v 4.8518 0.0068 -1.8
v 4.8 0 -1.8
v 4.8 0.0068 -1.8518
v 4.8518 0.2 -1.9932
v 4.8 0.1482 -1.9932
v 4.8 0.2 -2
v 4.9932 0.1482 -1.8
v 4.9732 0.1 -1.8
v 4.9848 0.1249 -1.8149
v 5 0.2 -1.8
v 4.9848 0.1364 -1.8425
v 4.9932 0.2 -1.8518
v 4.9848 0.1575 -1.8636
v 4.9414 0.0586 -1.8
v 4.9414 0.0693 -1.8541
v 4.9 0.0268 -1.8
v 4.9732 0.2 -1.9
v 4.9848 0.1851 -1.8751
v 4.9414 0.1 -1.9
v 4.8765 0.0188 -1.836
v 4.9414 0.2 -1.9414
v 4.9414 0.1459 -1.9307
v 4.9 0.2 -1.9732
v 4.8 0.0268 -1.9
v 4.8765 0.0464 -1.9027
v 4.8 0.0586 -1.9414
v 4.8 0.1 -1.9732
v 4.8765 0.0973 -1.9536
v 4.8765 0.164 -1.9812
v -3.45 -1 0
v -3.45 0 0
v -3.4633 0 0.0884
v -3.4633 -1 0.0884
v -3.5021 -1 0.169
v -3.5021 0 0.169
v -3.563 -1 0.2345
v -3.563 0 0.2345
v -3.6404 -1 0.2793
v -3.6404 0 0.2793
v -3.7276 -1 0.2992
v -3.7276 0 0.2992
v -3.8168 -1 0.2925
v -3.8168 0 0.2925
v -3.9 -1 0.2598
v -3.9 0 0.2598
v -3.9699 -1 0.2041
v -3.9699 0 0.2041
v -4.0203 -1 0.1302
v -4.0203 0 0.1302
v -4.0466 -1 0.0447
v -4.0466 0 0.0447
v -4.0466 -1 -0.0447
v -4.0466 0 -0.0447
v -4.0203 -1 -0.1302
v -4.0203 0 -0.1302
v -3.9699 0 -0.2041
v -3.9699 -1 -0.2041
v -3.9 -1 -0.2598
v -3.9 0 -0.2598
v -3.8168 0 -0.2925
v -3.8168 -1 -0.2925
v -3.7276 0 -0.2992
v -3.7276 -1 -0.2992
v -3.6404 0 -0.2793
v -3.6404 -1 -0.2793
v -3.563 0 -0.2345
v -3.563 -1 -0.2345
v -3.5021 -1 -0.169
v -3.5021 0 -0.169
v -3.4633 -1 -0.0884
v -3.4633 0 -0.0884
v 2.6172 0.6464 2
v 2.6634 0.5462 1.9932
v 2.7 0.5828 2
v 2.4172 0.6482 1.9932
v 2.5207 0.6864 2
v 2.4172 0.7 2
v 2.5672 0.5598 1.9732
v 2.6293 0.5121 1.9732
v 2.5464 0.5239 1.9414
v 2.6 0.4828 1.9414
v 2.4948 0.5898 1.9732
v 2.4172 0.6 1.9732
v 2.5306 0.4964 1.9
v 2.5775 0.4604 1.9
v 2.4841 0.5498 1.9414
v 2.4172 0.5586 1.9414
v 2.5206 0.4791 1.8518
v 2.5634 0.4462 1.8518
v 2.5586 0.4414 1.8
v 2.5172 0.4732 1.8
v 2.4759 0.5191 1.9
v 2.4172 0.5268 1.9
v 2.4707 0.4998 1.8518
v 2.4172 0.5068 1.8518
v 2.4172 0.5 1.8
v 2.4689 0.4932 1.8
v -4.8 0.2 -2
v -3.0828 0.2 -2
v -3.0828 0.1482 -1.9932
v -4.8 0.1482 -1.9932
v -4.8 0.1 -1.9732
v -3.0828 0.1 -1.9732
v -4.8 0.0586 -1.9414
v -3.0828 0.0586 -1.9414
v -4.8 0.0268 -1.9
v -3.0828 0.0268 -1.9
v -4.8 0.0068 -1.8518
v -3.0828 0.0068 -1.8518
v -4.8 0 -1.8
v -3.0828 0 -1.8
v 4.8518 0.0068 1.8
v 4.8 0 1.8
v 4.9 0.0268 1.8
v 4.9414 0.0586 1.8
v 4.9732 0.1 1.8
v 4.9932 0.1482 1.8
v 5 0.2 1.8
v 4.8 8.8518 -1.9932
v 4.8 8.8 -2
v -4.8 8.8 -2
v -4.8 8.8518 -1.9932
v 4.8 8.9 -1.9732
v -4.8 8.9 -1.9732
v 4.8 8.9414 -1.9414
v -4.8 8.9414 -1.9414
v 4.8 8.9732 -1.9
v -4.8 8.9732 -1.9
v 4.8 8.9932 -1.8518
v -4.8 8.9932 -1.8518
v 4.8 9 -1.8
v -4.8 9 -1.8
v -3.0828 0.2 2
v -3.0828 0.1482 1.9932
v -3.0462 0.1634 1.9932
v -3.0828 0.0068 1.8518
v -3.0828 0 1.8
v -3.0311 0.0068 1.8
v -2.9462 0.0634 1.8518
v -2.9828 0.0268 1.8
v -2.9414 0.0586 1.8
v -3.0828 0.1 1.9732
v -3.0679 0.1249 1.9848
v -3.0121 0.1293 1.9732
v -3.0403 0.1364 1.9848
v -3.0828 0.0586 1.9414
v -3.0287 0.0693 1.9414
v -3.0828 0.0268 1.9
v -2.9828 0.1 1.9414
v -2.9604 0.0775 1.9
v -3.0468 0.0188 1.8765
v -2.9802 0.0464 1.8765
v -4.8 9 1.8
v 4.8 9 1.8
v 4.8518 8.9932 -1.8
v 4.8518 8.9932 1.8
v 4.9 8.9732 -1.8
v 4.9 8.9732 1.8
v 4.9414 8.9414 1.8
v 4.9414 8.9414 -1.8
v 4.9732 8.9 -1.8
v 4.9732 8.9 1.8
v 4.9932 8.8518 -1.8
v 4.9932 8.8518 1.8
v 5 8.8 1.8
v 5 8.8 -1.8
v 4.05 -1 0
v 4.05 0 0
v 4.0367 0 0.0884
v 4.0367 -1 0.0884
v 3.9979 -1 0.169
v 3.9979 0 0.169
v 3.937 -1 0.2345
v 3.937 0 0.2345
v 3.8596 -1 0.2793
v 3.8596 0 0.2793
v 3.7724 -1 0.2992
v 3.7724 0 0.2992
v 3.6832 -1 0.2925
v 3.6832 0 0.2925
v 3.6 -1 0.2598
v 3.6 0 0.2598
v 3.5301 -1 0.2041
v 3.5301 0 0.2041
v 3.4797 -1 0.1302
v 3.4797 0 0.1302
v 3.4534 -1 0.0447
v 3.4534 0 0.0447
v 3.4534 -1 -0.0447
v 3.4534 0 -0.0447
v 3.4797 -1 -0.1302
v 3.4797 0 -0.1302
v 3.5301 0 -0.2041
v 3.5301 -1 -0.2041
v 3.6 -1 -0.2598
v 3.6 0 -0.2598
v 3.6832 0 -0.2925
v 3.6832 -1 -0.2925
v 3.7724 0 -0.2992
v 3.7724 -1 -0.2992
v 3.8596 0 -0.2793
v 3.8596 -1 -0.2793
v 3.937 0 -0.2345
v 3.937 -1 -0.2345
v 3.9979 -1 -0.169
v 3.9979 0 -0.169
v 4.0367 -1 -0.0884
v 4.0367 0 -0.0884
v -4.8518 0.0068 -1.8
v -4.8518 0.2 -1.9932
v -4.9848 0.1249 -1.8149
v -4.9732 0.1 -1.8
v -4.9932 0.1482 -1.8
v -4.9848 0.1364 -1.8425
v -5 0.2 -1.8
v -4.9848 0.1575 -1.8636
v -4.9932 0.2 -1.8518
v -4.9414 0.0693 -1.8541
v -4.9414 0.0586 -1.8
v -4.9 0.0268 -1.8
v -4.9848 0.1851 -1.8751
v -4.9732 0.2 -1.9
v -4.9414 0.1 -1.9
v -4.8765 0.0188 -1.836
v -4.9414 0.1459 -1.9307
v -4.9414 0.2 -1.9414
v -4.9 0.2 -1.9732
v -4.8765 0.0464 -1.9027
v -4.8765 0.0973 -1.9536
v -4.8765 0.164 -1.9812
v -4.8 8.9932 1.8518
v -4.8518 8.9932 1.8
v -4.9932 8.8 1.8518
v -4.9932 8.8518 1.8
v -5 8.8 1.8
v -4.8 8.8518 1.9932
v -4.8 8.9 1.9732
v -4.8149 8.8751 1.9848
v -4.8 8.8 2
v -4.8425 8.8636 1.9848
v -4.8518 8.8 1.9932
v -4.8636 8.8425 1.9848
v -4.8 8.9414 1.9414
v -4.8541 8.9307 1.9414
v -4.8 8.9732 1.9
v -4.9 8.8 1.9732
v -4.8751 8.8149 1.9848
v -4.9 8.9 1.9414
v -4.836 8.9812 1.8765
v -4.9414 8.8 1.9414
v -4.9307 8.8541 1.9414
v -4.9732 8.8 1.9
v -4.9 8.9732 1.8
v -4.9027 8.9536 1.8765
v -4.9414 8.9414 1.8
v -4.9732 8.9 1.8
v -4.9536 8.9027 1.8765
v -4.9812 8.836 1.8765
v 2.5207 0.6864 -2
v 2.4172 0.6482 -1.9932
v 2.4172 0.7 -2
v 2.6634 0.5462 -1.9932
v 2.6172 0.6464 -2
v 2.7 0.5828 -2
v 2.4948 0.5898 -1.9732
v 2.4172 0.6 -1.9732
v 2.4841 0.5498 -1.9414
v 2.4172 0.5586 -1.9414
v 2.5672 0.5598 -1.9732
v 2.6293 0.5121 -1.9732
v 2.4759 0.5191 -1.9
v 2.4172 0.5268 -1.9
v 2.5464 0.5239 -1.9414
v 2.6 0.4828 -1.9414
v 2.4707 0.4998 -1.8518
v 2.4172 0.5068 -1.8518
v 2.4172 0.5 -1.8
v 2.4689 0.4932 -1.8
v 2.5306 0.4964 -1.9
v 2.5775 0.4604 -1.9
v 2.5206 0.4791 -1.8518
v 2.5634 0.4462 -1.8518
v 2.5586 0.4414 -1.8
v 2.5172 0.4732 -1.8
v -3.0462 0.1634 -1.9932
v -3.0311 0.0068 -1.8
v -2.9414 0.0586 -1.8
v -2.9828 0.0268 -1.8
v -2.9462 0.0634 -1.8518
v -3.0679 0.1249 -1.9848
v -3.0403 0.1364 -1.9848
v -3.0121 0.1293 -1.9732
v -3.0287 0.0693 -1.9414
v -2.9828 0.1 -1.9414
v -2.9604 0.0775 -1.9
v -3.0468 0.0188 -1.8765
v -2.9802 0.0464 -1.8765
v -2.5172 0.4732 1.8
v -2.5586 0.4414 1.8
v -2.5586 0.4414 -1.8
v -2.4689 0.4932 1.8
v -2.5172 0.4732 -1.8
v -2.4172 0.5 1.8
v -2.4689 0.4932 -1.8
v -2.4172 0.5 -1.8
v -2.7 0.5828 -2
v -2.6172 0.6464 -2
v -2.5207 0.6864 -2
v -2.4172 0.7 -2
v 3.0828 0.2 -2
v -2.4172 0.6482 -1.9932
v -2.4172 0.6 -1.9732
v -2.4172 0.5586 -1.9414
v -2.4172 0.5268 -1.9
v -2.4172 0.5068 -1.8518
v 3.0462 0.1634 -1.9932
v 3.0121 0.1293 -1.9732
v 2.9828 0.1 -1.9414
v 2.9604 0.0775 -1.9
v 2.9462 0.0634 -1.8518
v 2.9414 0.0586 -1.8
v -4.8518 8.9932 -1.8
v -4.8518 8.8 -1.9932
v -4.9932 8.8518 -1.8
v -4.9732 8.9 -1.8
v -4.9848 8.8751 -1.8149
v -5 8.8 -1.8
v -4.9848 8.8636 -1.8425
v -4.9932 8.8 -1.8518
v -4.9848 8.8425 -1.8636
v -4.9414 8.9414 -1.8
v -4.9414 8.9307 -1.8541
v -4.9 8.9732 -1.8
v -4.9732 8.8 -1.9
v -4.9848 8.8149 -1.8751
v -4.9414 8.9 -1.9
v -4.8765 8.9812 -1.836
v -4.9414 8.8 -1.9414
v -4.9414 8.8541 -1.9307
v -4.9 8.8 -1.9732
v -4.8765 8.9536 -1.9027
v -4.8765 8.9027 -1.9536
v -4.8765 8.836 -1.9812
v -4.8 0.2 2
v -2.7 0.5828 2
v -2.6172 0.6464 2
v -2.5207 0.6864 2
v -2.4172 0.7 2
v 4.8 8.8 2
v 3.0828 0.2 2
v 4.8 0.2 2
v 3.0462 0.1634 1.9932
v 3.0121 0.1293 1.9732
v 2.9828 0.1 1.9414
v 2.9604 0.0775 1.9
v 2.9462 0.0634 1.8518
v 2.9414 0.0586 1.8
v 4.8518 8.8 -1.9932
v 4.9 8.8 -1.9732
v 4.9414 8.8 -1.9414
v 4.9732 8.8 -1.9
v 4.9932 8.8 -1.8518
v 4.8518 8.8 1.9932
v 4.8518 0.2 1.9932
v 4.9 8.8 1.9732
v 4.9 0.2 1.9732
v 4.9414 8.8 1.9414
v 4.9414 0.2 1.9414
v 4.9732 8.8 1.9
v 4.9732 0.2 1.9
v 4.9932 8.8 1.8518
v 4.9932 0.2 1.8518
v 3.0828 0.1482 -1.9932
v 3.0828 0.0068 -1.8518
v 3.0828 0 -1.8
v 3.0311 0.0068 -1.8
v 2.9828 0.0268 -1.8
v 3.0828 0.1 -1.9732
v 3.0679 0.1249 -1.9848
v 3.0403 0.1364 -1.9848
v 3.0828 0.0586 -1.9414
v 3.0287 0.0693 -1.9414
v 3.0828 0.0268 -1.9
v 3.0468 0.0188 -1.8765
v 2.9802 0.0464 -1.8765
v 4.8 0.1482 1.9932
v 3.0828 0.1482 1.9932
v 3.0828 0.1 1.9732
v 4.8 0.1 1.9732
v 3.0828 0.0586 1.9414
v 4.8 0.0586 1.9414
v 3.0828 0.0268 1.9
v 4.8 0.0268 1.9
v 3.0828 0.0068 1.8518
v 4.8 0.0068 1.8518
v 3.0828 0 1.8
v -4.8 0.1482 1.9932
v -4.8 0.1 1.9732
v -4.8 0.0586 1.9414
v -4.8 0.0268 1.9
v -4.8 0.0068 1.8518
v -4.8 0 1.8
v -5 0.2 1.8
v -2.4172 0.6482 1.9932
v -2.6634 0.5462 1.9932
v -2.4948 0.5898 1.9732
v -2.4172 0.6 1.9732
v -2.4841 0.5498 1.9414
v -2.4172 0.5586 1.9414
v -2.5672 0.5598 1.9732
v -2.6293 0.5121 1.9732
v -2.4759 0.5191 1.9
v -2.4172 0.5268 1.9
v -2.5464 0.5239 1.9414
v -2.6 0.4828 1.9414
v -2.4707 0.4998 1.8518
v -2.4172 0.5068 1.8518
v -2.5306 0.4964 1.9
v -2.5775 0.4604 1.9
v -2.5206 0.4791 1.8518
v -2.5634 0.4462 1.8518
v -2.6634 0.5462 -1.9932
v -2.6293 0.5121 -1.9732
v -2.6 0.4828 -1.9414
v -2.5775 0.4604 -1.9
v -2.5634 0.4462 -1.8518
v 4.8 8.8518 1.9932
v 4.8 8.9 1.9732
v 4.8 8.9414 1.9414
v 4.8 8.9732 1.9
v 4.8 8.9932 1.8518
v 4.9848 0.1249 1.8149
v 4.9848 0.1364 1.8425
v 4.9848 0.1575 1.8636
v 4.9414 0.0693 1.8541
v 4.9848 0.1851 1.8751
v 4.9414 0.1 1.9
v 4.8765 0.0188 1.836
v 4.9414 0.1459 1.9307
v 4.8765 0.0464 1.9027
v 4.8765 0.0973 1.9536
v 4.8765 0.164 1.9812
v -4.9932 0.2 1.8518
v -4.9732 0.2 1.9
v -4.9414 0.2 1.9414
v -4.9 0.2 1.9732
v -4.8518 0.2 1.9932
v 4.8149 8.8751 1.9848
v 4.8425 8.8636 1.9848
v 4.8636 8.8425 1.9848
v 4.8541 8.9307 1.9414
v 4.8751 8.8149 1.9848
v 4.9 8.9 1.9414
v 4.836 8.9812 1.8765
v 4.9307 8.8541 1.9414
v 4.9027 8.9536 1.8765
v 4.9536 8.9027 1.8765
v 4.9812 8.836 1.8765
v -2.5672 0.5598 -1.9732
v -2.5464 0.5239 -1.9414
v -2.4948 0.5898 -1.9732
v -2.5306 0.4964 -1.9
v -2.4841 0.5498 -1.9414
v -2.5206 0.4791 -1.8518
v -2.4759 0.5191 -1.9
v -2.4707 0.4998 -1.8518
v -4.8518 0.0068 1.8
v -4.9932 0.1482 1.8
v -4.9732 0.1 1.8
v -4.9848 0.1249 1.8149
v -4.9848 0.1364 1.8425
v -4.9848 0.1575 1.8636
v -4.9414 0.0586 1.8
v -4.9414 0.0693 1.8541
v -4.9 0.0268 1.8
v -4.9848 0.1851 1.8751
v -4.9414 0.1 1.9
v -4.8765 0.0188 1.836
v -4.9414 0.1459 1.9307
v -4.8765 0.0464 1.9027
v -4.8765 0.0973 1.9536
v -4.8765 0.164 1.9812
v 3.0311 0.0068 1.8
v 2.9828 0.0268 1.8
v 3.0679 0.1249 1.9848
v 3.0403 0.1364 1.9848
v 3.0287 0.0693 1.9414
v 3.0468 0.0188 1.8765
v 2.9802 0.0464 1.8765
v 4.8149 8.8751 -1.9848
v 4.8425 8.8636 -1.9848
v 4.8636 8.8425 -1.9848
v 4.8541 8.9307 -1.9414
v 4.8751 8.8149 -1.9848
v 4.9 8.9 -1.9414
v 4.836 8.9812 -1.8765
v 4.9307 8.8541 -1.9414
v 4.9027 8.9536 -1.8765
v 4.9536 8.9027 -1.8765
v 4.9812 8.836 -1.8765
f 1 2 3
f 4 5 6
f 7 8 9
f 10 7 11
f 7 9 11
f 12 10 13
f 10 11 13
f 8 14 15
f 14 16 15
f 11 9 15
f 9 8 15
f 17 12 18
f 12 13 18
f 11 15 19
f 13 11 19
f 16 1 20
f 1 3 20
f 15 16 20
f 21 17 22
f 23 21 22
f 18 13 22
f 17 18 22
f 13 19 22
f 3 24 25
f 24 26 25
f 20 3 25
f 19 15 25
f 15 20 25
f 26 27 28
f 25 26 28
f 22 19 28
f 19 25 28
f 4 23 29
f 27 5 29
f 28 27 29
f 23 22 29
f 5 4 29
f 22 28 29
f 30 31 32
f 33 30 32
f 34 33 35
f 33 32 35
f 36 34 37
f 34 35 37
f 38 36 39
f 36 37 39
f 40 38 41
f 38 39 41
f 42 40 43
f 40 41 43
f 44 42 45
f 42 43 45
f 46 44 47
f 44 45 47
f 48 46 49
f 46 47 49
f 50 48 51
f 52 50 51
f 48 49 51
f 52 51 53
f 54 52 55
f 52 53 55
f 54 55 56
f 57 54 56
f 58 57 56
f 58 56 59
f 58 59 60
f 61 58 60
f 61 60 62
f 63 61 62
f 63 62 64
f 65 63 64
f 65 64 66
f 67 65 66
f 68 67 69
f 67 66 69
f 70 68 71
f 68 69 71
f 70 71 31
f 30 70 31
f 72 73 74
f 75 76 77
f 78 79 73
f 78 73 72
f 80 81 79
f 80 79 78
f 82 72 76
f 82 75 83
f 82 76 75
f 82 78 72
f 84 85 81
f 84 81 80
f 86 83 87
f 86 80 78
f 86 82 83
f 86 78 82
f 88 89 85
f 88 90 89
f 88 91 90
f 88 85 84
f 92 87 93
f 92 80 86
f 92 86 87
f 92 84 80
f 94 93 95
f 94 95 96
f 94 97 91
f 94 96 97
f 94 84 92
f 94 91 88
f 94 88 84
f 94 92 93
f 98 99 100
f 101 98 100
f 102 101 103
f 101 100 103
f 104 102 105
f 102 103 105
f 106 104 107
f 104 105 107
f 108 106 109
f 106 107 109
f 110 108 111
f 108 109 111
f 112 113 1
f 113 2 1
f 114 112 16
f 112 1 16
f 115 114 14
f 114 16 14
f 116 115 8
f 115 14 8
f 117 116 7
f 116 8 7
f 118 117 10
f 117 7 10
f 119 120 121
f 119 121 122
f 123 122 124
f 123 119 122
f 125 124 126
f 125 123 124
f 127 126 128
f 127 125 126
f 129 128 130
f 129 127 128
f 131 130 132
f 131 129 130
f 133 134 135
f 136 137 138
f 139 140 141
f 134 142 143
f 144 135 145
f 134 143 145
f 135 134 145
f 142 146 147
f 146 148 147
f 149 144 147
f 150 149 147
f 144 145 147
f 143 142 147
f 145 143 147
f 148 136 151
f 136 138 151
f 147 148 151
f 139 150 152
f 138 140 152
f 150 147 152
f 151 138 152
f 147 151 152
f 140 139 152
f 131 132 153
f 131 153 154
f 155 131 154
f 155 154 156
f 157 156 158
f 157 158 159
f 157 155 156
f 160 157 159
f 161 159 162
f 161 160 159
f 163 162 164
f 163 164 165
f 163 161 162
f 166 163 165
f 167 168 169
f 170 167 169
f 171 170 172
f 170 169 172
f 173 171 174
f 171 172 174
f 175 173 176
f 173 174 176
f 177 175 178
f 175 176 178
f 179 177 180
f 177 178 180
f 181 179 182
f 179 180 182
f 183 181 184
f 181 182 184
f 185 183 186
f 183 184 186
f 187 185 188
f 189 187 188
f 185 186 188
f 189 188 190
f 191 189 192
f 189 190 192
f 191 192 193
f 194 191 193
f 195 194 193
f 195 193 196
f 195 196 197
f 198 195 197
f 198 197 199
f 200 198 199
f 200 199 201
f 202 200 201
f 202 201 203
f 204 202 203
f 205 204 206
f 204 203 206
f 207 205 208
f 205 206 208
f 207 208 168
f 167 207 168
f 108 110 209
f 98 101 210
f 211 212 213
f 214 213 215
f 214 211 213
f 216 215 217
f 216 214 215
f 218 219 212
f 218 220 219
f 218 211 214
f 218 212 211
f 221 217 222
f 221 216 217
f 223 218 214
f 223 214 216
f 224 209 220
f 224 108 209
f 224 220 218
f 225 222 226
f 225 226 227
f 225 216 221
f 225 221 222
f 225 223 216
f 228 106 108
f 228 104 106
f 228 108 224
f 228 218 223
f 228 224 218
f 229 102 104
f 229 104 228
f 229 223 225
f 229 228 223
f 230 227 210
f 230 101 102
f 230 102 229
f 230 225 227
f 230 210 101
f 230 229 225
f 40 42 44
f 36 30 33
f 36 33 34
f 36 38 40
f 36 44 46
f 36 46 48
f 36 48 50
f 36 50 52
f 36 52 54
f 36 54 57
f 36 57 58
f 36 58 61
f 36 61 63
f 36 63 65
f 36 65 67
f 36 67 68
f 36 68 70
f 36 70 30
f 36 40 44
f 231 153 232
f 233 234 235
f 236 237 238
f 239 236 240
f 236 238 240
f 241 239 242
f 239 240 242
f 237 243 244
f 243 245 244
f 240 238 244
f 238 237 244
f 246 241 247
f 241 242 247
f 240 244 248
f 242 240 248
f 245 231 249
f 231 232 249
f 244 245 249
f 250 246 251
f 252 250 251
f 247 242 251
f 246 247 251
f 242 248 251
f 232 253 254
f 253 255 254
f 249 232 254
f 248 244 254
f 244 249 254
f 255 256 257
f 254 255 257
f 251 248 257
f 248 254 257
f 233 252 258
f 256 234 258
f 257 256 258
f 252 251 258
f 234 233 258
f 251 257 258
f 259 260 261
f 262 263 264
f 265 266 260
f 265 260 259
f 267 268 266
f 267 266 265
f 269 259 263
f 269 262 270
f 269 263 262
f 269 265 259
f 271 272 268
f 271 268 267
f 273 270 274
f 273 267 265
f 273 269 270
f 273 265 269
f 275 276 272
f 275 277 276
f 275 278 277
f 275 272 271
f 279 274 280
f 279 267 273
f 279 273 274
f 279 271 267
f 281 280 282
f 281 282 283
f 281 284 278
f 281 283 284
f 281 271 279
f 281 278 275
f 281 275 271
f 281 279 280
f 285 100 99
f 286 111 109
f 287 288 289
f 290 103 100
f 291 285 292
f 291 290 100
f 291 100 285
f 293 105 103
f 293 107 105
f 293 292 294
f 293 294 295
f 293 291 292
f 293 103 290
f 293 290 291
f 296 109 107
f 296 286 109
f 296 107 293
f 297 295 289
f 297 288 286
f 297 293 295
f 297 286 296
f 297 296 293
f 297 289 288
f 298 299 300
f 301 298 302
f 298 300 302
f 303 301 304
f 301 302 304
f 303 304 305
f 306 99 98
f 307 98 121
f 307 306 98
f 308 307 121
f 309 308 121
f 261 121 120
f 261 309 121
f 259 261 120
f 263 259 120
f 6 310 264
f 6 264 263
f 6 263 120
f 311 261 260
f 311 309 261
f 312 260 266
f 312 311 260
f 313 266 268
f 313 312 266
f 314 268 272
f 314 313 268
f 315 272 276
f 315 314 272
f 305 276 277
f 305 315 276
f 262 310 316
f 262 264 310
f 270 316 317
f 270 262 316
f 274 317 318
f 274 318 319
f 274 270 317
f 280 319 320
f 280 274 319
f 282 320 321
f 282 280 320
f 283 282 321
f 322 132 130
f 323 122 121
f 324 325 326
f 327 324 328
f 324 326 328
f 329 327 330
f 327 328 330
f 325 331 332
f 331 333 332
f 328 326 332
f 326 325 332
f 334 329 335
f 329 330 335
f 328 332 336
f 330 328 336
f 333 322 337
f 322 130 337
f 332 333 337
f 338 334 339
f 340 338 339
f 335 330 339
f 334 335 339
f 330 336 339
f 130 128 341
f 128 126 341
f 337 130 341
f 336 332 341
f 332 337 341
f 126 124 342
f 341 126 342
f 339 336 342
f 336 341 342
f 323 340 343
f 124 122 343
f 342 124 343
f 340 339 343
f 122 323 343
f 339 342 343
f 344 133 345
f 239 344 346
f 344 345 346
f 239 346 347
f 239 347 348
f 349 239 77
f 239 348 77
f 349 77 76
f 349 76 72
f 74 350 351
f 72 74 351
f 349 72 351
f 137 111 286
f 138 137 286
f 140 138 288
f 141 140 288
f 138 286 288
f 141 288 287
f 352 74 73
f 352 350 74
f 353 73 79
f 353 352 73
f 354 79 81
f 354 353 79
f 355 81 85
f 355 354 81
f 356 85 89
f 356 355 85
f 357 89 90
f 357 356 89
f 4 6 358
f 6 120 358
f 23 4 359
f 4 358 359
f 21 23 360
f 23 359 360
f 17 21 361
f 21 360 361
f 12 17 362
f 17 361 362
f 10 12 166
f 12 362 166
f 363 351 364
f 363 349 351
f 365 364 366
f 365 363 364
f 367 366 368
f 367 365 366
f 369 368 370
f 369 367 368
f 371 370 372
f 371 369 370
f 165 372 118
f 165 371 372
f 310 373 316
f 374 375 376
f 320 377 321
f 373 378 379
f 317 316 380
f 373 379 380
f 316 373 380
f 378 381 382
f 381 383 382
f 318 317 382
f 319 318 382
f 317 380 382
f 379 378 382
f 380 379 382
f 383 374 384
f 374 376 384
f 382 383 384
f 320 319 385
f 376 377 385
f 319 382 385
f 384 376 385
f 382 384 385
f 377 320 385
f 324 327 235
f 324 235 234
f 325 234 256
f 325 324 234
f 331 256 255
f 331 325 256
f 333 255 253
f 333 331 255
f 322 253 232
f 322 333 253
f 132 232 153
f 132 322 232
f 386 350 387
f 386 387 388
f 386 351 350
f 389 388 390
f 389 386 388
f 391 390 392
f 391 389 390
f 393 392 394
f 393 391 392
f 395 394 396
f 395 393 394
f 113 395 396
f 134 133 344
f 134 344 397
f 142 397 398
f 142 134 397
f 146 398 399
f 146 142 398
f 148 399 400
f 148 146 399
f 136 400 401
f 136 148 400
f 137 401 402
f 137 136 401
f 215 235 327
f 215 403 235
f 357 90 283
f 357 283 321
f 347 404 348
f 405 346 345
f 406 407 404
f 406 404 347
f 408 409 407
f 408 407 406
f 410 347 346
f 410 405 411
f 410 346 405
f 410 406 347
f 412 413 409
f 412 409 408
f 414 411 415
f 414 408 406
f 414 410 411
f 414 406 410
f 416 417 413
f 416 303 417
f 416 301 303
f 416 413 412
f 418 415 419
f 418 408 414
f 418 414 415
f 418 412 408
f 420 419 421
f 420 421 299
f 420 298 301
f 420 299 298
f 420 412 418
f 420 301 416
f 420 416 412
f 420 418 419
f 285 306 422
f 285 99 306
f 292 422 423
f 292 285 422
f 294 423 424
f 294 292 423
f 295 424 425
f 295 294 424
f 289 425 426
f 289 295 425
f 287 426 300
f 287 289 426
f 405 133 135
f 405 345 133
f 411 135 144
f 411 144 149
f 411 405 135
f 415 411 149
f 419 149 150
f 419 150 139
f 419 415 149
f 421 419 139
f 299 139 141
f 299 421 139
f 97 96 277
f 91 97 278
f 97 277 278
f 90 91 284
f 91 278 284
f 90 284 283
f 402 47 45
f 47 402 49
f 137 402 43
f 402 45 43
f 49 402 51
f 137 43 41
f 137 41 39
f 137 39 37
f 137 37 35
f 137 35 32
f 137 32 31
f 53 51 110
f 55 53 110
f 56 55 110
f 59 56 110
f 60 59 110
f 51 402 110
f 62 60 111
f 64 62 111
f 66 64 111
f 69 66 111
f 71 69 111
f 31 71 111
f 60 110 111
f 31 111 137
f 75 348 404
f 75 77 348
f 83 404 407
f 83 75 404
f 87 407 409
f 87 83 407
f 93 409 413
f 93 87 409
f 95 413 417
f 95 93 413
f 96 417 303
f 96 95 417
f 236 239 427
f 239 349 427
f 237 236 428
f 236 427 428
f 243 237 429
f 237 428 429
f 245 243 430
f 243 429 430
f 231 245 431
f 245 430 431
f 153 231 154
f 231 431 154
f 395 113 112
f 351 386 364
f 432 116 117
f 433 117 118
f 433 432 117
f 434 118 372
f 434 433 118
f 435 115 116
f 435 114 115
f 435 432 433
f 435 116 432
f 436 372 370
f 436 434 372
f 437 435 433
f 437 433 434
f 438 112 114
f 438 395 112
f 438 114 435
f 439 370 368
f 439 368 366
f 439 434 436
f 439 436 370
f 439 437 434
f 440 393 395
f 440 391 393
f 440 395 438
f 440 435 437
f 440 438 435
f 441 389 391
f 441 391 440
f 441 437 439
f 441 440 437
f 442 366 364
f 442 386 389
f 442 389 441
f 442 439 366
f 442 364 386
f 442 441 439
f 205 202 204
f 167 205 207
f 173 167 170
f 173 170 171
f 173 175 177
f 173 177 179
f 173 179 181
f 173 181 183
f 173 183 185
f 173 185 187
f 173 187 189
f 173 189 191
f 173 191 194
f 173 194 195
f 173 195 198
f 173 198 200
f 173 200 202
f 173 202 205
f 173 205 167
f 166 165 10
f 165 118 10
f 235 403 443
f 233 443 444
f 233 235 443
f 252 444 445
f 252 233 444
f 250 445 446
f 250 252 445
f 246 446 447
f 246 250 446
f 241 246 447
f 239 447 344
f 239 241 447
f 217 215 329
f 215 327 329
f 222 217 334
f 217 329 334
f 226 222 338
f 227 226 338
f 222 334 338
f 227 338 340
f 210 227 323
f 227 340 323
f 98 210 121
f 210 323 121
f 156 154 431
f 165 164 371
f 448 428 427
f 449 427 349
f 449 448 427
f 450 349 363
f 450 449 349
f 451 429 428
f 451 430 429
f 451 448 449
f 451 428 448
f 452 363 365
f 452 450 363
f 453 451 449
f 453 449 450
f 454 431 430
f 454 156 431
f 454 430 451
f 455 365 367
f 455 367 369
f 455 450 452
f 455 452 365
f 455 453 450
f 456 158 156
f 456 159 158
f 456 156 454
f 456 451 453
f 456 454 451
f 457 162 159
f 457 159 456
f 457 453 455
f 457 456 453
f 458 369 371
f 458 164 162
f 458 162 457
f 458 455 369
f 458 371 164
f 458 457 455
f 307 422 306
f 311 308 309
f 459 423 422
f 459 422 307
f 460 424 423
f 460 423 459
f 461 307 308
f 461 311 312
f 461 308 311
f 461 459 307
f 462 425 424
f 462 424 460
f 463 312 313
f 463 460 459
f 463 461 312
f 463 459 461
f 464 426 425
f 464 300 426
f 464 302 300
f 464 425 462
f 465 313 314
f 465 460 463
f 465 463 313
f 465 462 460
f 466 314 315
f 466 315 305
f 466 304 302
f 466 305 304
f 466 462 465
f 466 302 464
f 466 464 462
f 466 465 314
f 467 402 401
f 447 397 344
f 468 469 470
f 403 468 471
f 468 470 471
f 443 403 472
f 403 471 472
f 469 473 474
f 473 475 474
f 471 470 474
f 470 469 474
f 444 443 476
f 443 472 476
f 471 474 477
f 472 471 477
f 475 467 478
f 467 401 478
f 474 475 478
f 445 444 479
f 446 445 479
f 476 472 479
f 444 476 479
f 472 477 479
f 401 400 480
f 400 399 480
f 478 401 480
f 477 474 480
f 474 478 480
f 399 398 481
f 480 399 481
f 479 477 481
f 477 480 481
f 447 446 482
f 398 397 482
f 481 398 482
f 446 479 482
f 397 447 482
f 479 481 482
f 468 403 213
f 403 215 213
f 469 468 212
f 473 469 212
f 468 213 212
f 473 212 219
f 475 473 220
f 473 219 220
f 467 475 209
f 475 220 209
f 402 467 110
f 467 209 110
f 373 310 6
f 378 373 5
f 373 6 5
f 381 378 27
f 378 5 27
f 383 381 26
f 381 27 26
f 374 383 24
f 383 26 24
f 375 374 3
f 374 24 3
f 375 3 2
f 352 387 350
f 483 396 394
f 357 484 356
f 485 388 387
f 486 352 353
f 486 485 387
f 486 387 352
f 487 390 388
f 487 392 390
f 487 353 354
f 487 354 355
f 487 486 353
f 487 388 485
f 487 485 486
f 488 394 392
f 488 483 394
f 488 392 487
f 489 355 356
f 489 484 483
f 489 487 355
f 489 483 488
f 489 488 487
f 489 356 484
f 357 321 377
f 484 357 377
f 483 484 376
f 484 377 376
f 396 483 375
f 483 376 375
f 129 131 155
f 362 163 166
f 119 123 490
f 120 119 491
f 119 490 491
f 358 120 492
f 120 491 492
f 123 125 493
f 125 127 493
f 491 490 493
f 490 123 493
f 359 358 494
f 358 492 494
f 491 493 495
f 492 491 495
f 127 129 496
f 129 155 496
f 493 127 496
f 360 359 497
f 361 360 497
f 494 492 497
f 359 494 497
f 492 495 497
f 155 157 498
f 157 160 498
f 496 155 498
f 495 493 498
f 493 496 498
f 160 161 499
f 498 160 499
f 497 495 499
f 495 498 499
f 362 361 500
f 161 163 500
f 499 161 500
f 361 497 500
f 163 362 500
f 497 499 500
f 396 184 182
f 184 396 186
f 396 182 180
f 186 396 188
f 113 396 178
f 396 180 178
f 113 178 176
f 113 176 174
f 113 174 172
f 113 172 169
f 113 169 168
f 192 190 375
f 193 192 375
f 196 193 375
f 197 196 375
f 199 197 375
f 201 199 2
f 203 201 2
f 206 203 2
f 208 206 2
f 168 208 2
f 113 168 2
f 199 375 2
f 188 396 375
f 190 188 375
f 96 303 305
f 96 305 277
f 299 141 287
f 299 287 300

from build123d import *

# Parameters (mm, degrees)
SKETCH1_W           = 10
SKETCH1_H           = 4
BOSS_EXTRUDE1_DEPTH = 9
CUT_EXTRUDE1_DEPTH  = 5
SKETCH3_R           = 0.3
BOSS_EXTRUDE2_DEPTH = 1
FILLET1_R           = 0.2


with BuildPart() as part:
    # Sketch1 → Boss-Extrude1 (new body)
    with BuildSketch(Plane(origin=(0, 0, 0), x_dir=(1, 0, 0), z_dir=(0, 1, 0))):
        Rectangle(SKETCH1_W, SKETCH1_H)
    extrude(amount=BOSS_EXTRUDE1_DEPTH)

    # Sketch2 → Cut-Extrude1 (cut, through all)
    with BuildSketch(Plane.XY.offset(2)):
        Polygon((-3, 0), (-2.5, 0.5), (2.5, 0.5), (3, 0), (3, -1.5), (-3, -1.5), align=None)
    extrude(amount=-CUT_EXTRUDE1_DEPTH, mode=Mode.SUBTRACT)

    # Sketch3 → Boss-Extrude2 (add)
    with BuildSketch(Plane.XZ):
        with Locations((3.75, 0)):
            Circle(SKETCH3_R)
        with Locations((-3.75, 0)):
            Circle(SKETCH3_R)
    extrude(amount=BOSS_EXTRUDE2_DEPTH)

    # Fillet1
    fillet1_edges = [part.edges().sort_by_distance(p)[0] for p in [
        (5, 9, 0),
        (0, 9, -2),
        (-4, 0, -2),
        (4, 0, 2),
        (2.75, 0.25, 2),
        (0, 0.5, 2),
        (-2.75, 0.25, 2),
        (-2.75, 0.25, -2),
        (-3, 0, 0),
        (0, 0.5, -2),
        (-2.5, 0.5, 0),
        (2.75, 0.25, -2),
        (2.5, 0.5, 0),
        (3, 0, 0),
        (-5, 9, 0),
        (4, 0, -2),
        (5, 0, 0),
        (-4, 0, 2),
        (-5, 0, 0),
        (0, 9, 2),
        (-5, 4.5, -2),
        (5, 4.5, -2),
        (5, 4.5, 2),
        (-5, 4.5, 2),
    ]]
    fillet(fillet1_edges, radius=FILLET1_R)


solid = part.part
